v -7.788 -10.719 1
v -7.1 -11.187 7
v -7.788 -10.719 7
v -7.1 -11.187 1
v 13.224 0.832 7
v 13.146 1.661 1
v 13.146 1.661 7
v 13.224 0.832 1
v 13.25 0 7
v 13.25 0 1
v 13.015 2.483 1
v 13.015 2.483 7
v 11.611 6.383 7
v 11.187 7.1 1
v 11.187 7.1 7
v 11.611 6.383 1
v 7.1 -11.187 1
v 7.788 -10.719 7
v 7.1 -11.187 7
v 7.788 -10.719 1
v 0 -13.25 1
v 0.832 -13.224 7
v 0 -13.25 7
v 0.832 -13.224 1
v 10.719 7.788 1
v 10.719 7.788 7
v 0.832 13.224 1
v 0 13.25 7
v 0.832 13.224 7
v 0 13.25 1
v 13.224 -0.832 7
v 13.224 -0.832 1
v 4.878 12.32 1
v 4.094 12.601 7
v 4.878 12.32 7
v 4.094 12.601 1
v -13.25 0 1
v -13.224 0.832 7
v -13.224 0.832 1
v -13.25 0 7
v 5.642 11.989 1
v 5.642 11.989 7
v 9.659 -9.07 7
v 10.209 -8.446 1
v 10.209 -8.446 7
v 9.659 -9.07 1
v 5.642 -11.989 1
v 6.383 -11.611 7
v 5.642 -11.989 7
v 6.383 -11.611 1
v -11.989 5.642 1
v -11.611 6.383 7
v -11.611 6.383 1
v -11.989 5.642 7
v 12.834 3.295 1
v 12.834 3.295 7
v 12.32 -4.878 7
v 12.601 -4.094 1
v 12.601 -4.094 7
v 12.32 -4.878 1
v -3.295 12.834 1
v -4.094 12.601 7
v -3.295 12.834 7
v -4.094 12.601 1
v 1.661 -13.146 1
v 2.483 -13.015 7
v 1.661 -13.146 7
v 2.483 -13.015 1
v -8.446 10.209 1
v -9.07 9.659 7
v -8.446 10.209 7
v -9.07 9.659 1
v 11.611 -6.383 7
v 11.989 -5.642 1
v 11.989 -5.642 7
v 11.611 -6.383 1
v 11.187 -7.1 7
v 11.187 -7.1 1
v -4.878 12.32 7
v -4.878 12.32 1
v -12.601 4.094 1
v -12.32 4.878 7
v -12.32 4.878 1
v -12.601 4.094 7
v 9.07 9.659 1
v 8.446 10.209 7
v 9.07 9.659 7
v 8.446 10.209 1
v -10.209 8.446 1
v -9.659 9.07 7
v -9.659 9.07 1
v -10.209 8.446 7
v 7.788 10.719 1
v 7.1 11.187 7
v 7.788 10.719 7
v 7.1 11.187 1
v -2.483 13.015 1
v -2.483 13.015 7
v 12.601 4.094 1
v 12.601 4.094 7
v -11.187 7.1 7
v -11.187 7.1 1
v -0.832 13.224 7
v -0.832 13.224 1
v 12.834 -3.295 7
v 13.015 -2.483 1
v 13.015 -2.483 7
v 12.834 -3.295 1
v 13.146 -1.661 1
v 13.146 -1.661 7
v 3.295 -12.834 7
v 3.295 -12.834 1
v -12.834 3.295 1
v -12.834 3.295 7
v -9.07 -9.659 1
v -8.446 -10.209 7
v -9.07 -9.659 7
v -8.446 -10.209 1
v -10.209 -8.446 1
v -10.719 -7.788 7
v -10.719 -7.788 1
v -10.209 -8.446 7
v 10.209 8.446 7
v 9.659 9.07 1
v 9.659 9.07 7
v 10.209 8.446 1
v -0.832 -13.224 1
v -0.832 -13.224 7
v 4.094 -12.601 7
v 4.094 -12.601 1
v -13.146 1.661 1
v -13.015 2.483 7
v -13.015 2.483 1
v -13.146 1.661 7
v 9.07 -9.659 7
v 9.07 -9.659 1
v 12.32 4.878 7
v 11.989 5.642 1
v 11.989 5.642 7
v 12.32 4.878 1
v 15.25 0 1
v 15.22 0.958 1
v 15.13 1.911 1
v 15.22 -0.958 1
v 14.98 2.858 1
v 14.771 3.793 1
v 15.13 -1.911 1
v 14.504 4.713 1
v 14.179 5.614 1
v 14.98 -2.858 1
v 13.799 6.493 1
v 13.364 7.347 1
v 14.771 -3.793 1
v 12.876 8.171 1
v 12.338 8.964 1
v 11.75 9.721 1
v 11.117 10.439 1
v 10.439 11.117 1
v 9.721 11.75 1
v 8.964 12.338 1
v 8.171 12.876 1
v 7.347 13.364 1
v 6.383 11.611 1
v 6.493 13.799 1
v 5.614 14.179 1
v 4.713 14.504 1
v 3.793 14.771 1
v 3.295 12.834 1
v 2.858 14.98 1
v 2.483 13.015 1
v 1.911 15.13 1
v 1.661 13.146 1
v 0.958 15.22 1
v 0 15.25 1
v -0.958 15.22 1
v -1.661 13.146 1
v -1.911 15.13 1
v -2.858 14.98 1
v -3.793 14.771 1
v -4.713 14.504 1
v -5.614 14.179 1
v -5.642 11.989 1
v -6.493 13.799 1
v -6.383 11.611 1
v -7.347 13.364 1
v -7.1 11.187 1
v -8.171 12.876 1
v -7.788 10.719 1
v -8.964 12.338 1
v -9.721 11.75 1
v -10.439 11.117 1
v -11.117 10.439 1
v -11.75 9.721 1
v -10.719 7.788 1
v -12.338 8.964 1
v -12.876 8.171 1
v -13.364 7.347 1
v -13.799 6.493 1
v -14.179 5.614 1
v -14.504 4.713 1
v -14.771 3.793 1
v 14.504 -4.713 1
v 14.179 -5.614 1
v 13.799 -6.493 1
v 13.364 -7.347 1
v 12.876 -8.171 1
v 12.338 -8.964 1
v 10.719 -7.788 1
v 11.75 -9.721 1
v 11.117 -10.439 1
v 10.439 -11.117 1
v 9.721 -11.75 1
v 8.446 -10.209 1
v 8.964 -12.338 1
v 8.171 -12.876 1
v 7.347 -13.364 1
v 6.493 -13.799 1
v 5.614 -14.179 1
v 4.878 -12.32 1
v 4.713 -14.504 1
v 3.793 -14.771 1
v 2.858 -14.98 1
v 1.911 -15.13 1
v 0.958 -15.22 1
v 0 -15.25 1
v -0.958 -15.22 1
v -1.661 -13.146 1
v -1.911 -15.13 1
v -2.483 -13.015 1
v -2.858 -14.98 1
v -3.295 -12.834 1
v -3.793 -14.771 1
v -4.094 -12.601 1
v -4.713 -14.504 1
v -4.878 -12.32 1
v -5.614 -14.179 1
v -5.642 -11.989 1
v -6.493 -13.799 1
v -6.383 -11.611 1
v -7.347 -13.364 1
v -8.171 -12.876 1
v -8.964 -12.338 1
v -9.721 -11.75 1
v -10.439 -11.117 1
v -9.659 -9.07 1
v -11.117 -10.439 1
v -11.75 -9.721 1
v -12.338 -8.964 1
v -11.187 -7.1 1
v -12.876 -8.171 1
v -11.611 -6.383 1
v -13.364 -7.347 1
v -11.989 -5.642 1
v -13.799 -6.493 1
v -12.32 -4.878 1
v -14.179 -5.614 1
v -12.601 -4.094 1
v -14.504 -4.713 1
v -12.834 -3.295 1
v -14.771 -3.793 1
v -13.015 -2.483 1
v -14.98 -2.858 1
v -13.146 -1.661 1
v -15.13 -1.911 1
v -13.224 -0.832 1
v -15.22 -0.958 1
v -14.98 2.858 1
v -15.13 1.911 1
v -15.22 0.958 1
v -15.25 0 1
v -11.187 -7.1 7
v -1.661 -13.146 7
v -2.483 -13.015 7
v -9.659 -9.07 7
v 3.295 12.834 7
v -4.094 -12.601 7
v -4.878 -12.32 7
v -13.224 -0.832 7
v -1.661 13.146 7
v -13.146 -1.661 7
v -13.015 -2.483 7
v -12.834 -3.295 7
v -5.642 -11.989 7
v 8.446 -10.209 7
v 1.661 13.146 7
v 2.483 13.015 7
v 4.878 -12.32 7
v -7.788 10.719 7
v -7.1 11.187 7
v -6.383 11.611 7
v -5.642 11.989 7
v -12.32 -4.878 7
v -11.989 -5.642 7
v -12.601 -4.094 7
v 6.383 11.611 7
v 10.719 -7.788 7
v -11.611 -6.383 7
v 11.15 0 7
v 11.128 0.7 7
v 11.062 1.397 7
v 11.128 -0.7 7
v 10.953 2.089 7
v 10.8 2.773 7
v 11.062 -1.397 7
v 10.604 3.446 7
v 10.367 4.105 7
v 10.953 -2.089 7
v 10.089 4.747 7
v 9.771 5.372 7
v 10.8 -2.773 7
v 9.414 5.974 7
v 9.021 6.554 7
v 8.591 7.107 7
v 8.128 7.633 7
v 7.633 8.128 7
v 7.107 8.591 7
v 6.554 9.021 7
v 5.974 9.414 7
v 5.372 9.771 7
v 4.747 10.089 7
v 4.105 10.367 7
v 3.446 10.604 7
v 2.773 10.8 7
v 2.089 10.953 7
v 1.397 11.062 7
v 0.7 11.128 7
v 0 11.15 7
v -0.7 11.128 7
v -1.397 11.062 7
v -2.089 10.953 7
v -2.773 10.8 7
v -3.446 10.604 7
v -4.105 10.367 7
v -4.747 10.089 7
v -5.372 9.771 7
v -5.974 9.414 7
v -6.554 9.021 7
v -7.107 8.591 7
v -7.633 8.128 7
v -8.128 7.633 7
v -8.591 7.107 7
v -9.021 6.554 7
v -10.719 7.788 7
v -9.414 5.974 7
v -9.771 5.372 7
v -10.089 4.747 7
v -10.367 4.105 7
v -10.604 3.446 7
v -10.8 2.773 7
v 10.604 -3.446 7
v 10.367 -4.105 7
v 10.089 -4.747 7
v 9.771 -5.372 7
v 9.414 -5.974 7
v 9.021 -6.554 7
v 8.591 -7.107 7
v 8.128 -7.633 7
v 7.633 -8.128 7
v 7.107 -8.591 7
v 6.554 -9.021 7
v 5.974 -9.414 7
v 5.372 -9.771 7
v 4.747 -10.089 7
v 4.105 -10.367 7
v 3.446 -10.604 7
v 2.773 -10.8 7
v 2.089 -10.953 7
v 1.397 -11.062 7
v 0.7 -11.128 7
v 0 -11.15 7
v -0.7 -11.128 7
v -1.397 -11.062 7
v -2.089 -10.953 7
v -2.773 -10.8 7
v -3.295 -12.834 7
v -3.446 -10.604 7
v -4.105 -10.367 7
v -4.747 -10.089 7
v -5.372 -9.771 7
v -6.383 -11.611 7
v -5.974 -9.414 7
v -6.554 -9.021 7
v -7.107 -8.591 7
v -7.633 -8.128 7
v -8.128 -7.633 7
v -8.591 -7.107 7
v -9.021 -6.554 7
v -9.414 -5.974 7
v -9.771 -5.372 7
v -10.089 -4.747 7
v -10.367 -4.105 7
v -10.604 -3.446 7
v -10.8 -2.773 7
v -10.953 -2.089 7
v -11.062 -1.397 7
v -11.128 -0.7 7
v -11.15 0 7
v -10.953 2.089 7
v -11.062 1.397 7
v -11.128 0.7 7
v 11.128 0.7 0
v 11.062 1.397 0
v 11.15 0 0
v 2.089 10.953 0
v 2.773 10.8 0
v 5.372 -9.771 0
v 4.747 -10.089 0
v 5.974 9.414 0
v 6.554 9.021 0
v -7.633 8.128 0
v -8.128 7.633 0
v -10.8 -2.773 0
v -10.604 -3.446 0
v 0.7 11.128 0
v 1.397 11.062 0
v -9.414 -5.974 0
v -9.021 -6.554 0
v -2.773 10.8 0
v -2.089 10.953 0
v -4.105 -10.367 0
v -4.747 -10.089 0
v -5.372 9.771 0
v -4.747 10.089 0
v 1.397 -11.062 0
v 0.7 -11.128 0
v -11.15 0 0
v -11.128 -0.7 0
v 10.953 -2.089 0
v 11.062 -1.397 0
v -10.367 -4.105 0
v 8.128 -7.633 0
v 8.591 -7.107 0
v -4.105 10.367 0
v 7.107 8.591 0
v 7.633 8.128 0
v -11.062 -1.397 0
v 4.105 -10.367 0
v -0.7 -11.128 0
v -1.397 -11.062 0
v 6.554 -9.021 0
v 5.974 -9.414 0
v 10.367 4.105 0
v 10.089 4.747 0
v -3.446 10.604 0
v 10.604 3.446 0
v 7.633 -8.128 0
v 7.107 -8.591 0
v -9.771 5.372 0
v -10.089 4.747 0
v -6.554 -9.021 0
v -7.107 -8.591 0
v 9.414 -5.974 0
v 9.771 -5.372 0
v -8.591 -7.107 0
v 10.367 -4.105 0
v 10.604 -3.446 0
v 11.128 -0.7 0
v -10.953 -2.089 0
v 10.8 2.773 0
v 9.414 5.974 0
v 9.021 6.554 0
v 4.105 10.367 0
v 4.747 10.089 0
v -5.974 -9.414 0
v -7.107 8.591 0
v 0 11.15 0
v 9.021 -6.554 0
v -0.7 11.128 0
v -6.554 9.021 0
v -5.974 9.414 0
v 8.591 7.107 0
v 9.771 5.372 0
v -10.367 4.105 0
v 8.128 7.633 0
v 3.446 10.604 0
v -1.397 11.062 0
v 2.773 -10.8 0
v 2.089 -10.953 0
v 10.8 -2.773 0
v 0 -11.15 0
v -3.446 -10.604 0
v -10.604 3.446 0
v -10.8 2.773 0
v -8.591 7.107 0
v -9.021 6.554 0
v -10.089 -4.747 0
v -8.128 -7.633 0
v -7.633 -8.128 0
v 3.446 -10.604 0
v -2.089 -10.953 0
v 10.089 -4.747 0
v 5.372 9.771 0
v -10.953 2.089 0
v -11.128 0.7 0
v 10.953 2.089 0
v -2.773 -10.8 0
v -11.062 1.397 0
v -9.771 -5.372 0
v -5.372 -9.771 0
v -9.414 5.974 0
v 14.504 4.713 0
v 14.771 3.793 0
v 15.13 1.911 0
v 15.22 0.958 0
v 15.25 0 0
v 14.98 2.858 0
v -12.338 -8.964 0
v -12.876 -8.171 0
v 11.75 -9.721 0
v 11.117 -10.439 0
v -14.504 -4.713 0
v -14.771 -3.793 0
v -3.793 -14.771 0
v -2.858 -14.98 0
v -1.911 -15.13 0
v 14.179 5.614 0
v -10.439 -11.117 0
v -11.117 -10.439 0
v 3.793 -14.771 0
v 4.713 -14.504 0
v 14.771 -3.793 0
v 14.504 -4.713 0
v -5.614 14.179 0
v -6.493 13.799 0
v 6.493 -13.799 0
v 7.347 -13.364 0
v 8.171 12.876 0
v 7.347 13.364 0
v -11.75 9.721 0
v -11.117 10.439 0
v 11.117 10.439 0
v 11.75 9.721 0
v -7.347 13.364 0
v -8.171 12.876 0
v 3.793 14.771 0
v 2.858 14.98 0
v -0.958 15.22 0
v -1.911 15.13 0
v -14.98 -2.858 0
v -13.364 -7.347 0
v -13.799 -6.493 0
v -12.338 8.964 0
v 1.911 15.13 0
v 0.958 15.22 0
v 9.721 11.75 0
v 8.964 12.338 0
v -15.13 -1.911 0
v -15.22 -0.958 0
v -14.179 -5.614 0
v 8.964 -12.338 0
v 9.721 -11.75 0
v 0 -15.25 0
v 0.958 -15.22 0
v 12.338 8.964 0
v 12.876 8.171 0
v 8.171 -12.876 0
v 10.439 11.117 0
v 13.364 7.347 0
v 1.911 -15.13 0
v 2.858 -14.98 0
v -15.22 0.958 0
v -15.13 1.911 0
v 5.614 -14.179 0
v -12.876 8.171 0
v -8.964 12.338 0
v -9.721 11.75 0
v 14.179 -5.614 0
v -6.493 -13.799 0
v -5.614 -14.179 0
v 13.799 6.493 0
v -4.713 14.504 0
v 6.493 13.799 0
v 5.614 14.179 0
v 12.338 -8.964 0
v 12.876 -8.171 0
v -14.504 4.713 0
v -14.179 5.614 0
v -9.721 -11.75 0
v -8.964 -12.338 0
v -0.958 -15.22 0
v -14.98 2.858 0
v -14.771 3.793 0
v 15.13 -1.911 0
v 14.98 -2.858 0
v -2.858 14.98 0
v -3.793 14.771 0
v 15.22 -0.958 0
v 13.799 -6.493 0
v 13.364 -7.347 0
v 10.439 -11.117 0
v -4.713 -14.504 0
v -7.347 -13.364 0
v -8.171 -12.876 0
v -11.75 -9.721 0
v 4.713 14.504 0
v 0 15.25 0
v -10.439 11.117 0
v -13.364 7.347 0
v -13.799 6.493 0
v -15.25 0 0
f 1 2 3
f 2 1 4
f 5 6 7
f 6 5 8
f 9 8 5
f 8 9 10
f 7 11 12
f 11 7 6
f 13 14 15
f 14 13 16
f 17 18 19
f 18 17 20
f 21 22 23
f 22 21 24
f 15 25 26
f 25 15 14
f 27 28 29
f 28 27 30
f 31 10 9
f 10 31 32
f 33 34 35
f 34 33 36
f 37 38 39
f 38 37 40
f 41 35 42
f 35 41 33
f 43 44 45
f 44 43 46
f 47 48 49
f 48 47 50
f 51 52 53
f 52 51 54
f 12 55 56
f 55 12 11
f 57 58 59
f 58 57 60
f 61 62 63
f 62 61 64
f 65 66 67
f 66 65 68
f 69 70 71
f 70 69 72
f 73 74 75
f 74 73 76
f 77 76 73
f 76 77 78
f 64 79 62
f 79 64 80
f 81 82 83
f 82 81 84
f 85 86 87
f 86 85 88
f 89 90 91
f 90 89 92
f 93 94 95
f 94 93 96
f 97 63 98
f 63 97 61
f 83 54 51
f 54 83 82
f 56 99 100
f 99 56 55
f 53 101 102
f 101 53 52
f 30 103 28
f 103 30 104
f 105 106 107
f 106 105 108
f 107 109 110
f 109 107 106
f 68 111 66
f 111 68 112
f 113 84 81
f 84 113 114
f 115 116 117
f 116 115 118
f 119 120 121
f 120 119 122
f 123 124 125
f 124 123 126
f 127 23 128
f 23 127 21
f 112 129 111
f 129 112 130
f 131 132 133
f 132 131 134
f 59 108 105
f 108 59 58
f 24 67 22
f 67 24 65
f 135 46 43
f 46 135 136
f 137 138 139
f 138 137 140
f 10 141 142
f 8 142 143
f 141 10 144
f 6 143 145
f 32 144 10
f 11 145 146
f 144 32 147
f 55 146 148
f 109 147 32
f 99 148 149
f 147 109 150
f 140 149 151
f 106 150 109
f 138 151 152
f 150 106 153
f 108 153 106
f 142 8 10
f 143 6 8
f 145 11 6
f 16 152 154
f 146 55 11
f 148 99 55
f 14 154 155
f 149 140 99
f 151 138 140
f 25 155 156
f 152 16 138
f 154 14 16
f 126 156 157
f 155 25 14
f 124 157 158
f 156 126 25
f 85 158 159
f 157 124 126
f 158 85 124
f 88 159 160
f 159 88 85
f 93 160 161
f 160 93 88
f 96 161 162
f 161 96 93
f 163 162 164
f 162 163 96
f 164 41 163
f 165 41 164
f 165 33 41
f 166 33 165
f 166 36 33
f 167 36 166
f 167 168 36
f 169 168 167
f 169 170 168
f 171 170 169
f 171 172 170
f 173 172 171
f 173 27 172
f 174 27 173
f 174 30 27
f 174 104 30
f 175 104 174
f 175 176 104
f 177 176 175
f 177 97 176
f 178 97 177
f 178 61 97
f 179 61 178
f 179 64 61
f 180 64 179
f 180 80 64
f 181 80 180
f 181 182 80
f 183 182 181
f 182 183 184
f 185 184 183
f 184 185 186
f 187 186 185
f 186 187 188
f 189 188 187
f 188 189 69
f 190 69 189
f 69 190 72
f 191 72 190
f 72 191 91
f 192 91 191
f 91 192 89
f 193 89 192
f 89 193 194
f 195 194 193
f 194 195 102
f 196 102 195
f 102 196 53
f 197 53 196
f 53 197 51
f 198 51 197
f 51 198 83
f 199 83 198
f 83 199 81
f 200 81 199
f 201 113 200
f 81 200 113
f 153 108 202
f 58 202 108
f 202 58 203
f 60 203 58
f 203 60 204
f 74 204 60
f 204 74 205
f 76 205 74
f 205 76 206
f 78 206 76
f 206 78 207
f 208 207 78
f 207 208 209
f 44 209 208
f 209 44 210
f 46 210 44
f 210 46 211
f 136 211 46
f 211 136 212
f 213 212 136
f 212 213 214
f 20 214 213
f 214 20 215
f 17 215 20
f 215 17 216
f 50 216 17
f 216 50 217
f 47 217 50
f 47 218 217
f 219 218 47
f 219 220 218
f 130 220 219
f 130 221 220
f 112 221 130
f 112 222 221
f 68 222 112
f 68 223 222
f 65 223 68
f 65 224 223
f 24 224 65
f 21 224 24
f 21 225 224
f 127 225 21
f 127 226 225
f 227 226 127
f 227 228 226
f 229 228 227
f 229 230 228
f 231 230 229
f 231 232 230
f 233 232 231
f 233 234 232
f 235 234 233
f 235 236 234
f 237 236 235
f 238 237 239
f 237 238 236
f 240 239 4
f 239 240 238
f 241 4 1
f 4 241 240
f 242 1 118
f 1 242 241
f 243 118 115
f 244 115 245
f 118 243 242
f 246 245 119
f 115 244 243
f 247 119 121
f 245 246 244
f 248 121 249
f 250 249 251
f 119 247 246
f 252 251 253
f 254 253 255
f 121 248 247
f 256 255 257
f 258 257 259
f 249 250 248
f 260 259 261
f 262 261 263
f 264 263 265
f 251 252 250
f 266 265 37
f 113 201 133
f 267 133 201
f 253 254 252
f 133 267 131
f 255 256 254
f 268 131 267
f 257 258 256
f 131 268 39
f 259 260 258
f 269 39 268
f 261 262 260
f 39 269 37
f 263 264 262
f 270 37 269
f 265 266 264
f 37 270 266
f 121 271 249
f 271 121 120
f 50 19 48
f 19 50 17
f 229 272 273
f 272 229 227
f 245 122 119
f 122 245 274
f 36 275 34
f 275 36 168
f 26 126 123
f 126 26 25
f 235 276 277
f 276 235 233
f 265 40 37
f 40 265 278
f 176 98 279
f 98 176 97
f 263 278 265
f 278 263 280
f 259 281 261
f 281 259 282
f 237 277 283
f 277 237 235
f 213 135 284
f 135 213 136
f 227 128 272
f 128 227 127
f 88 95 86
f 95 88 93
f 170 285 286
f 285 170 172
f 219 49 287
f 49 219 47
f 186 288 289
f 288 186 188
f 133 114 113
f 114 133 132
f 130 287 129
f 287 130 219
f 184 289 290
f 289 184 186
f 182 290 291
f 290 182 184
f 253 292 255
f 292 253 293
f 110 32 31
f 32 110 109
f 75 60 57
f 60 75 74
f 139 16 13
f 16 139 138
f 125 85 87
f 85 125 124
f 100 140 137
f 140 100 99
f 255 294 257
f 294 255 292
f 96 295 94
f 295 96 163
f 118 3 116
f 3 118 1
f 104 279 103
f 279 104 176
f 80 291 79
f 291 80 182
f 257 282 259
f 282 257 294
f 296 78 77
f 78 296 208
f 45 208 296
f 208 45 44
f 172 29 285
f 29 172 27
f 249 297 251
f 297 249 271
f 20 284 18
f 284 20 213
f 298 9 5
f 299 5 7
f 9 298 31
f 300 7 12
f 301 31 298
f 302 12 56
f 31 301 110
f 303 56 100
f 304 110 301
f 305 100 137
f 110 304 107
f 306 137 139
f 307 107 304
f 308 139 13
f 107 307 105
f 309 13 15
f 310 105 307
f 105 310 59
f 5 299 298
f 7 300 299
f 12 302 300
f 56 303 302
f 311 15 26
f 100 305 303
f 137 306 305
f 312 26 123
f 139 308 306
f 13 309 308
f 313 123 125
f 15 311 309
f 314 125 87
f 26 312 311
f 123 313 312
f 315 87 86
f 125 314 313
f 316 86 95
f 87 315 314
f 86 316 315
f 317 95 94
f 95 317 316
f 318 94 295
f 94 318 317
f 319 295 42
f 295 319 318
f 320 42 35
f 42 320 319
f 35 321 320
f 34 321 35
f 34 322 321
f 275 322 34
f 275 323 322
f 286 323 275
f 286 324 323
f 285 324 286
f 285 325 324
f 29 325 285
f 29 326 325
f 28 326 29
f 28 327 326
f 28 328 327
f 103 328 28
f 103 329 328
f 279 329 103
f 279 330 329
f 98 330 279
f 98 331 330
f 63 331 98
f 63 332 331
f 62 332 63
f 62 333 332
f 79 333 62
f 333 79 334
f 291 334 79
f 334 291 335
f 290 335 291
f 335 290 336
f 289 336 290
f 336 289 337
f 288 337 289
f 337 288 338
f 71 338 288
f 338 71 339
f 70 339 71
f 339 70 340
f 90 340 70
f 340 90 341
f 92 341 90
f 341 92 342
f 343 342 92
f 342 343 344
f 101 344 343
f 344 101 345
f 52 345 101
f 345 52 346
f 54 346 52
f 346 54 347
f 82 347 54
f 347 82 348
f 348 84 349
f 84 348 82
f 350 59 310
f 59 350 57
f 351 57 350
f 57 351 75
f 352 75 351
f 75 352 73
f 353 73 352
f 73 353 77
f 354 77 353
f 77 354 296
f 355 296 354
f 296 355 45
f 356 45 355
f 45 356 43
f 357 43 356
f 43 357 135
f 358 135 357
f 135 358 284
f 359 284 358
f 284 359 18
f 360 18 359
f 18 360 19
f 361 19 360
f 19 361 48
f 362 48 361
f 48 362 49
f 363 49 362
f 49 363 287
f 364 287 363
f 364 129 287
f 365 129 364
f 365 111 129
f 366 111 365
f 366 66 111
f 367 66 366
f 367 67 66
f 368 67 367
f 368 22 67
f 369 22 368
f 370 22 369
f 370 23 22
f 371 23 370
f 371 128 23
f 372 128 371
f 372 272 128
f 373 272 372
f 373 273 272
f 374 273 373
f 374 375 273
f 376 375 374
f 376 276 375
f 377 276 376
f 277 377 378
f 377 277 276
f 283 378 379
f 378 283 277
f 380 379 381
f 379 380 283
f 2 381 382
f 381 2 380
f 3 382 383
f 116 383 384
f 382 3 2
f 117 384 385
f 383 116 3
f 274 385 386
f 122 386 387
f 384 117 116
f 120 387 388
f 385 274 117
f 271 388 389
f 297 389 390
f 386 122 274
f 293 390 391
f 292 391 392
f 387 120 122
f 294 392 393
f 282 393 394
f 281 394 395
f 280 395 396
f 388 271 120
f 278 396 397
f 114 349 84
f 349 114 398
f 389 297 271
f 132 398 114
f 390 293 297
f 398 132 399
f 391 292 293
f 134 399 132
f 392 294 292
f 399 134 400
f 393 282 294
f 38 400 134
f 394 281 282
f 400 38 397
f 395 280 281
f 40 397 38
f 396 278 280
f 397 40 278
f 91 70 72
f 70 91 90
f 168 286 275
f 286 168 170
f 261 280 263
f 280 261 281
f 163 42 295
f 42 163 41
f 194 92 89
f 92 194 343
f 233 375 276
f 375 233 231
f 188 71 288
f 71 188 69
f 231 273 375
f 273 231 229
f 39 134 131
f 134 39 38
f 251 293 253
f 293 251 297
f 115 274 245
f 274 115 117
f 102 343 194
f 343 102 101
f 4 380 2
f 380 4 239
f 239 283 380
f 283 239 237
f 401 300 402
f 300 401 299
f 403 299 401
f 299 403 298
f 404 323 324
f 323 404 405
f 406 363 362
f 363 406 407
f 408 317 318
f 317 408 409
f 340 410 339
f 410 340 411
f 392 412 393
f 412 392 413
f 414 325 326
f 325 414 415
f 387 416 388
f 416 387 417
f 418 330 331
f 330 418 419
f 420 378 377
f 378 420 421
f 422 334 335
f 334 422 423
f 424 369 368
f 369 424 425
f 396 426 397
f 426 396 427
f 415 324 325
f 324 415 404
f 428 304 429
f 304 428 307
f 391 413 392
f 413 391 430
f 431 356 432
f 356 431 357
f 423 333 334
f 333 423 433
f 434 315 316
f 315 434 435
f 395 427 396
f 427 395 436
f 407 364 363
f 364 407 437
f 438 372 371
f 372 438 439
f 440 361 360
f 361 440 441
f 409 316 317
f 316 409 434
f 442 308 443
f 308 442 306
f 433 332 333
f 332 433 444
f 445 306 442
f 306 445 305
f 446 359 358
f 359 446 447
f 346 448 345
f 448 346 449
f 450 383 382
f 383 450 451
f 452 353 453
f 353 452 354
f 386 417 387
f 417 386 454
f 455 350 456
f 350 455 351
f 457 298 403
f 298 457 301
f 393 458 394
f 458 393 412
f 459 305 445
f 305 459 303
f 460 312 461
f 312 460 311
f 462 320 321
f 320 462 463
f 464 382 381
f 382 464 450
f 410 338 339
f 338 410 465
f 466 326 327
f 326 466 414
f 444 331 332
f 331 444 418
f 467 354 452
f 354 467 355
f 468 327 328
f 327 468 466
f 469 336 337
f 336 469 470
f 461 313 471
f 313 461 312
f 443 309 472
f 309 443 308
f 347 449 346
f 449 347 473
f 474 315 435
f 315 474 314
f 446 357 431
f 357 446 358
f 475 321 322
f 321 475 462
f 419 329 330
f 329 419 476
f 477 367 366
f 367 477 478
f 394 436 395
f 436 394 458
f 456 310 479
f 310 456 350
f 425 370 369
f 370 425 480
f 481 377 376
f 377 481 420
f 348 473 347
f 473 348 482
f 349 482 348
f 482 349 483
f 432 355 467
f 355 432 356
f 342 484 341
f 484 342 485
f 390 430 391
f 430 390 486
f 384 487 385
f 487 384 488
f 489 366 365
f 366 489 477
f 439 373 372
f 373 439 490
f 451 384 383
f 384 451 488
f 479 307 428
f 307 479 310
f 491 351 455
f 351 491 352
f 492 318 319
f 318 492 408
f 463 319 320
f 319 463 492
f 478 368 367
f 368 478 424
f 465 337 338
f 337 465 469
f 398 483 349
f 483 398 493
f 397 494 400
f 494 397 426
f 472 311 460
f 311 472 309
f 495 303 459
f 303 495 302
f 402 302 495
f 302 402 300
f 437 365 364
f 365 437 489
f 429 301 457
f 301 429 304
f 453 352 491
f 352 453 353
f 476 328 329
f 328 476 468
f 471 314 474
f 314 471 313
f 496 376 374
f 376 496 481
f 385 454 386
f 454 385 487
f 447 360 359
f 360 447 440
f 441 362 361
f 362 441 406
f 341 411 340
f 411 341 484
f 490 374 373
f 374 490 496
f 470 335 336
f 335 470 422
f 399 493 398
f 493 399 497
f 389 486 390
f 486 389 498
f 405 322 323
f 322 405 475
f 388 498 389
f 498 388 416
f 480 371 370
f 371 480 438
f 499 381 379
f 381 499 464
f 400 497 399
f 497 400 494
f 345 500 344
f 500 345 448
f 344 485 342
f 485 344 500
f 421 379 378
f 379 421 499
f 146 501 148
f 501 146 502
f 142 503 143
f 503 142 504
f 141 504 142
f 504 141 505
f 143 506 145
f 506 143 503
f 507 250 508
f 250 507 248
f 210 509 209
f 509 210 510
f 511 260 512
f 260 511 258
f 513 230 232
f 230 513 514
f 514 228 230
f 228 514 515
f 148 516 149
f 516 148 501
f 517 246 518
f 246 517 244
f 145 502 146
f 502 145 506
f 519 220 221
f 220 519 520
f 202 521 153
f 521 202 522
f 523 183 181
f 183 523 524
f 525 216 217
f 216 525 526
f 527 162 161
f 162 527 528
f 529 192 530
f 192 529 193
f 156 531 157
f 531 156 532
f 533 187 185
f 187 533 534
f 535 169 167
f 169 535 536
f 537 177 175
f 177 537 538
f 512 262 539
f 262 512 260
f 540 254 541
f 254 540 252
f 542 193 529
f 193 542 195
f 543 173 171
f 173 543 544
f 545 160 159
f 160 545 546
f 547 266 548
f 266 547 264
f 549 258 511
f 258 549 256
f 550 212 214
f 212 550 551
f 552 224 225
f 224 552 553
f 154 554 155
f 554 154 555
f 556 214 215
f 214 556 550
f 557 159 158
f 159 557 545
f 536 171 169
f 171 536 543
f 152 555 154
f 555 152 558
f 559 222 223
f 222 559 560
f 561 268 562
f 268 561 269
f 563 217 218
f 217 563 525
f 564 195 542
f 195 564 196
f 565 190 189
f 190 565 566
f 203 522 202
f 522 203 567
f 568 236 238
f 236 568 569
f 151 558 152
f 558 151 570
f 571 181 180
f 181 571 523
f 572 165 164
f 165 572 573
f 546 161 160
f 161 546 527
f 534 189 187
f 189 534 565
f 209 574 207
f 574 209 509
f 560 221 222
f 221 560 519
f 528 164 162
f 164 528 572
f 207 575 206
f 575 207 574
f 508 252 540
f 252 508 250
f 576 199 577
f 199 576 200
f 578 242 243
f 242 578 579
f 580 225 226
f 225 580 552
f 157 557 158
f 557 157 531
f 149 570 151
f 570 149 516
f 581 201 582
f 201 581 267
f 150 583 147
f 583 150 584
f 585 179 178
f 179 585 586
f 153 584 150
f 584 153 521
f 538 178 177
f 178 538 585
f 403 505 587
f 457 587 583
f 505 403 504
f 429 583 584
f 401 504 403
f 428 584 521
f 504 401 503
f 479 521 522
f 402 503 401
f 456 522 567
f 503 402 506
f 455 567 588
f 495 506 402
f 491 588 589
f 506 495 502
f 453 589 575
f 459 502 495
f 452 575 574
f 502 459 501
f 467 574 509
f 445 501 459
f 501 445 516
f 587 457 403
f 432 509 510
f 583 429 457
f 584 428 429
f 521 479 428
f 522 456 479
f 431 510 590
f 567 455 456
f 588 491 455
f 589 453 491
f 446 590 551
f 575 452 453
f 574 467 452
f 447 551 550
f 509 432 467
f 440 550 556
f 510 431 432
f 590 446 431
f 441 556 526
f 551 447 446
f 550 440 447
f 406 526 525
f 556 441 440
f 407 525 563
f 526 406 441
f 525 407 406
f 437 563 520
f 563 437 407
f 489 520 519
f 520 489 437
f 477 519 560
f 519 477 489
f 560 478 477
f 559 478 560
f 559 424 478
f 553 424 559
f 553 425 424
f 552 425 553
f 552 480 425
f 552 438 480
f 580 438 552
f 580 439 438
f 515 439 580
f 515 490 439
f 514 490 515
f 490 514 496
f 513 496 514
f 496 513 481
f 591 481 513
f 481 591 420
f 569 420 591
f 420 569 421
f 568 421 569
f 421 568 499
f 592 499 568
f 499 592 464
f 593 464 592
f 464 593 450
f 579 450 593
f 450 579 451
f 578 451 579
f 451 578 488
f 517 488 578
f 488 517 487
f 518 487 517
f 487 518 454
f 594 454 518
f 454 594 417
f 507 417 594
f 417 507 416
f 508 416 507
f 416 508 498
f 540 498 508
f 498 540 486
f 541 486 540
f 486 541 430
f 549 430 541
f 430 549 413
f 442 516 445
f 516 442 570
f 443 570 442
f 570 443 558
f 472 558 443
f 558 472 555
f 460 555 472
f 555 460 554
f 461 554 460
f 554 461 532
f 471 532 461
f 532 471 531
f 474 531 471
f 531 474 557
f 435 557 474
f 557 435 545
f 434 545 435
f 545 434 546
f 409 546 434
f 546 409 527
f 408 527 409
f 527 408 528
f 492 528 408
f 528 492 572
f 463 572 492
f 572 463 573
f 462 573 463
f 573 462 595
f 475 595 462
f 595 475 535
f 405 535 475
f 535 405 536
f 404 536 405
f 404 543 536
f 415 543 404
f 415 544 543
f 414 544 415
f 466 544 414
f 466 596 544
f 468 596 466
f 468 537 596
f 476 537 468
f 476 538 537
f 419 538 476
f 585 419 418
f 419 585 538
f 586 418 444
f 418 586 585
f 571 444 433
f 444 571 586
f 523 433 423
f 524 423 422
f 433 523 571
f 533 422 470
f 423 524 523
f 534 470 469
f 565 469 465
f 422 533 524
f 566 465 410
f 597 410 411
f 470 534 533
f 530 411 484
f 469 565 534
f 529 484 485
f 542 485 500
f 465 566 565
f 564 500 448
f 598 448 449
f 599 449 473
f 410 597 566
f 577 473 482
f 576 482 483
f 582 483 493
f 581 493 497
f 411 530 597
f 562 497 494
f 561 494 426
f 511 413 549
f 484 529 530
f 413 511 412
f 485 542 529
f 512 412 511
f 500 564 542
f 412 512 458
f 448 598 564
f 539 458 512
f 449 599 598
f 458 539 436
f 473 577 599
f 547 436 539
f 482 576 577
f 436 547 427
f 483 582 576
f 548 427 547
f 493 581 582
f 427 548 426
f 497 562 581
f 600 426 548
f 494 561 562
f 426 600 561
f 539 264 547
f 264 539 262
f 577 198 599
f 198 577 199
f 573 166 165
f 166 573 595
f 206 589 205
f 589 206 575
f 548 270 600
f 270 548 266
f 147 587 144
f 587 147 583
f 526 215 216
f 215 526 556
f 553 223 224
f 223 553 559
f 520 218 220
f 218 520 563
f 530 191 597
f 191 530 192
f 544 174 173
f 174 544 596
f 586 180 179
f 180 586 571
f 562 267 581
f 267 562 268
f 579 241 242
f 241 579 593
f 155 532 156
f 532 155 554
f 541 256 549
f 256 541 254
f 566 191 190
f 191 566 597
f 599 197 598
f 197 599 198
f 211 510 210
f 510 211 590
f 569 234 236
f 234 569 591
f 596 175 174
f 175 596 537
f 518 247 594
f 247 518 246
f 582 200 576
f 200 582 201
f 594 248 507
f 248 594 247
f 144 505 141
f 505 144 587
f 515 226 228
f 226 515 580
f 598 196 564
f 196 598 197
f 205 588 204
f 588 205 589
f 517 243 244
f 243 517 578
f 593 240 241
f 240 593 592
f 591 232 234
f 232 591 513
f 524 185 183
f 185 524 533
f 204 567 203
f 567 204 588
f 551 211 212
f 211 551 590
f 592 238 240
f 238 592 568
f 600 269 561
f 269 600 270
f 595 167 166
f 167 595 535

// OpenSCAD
/* [Spacer] */
inner_diameter = 22.3;
outer_diameter = 26.5;
// (not including lip thickness)
height = 6;
/* [Lip] */
lip_thickness = 1;
// (will be added to outer diameter)
lip_width = 2;
/* [Hidden] */
fn = 100;

// Spacer
translate([0, 0, lip_thickness])
    difference() {
        cylinder(r=outer_diameter/2, h=height, $fn=fn);
        cylinder(r=inner_diameter/2, h=height, $fn=fn);
    }

// Lip
difference() {
    cylinder(r=(outer_diameter/2)+lip_width, h=lip_thickness, $fn=fn);
    cylinder(r=inner_diameter/2, h=lip_thickness, $fn=fn);
}
